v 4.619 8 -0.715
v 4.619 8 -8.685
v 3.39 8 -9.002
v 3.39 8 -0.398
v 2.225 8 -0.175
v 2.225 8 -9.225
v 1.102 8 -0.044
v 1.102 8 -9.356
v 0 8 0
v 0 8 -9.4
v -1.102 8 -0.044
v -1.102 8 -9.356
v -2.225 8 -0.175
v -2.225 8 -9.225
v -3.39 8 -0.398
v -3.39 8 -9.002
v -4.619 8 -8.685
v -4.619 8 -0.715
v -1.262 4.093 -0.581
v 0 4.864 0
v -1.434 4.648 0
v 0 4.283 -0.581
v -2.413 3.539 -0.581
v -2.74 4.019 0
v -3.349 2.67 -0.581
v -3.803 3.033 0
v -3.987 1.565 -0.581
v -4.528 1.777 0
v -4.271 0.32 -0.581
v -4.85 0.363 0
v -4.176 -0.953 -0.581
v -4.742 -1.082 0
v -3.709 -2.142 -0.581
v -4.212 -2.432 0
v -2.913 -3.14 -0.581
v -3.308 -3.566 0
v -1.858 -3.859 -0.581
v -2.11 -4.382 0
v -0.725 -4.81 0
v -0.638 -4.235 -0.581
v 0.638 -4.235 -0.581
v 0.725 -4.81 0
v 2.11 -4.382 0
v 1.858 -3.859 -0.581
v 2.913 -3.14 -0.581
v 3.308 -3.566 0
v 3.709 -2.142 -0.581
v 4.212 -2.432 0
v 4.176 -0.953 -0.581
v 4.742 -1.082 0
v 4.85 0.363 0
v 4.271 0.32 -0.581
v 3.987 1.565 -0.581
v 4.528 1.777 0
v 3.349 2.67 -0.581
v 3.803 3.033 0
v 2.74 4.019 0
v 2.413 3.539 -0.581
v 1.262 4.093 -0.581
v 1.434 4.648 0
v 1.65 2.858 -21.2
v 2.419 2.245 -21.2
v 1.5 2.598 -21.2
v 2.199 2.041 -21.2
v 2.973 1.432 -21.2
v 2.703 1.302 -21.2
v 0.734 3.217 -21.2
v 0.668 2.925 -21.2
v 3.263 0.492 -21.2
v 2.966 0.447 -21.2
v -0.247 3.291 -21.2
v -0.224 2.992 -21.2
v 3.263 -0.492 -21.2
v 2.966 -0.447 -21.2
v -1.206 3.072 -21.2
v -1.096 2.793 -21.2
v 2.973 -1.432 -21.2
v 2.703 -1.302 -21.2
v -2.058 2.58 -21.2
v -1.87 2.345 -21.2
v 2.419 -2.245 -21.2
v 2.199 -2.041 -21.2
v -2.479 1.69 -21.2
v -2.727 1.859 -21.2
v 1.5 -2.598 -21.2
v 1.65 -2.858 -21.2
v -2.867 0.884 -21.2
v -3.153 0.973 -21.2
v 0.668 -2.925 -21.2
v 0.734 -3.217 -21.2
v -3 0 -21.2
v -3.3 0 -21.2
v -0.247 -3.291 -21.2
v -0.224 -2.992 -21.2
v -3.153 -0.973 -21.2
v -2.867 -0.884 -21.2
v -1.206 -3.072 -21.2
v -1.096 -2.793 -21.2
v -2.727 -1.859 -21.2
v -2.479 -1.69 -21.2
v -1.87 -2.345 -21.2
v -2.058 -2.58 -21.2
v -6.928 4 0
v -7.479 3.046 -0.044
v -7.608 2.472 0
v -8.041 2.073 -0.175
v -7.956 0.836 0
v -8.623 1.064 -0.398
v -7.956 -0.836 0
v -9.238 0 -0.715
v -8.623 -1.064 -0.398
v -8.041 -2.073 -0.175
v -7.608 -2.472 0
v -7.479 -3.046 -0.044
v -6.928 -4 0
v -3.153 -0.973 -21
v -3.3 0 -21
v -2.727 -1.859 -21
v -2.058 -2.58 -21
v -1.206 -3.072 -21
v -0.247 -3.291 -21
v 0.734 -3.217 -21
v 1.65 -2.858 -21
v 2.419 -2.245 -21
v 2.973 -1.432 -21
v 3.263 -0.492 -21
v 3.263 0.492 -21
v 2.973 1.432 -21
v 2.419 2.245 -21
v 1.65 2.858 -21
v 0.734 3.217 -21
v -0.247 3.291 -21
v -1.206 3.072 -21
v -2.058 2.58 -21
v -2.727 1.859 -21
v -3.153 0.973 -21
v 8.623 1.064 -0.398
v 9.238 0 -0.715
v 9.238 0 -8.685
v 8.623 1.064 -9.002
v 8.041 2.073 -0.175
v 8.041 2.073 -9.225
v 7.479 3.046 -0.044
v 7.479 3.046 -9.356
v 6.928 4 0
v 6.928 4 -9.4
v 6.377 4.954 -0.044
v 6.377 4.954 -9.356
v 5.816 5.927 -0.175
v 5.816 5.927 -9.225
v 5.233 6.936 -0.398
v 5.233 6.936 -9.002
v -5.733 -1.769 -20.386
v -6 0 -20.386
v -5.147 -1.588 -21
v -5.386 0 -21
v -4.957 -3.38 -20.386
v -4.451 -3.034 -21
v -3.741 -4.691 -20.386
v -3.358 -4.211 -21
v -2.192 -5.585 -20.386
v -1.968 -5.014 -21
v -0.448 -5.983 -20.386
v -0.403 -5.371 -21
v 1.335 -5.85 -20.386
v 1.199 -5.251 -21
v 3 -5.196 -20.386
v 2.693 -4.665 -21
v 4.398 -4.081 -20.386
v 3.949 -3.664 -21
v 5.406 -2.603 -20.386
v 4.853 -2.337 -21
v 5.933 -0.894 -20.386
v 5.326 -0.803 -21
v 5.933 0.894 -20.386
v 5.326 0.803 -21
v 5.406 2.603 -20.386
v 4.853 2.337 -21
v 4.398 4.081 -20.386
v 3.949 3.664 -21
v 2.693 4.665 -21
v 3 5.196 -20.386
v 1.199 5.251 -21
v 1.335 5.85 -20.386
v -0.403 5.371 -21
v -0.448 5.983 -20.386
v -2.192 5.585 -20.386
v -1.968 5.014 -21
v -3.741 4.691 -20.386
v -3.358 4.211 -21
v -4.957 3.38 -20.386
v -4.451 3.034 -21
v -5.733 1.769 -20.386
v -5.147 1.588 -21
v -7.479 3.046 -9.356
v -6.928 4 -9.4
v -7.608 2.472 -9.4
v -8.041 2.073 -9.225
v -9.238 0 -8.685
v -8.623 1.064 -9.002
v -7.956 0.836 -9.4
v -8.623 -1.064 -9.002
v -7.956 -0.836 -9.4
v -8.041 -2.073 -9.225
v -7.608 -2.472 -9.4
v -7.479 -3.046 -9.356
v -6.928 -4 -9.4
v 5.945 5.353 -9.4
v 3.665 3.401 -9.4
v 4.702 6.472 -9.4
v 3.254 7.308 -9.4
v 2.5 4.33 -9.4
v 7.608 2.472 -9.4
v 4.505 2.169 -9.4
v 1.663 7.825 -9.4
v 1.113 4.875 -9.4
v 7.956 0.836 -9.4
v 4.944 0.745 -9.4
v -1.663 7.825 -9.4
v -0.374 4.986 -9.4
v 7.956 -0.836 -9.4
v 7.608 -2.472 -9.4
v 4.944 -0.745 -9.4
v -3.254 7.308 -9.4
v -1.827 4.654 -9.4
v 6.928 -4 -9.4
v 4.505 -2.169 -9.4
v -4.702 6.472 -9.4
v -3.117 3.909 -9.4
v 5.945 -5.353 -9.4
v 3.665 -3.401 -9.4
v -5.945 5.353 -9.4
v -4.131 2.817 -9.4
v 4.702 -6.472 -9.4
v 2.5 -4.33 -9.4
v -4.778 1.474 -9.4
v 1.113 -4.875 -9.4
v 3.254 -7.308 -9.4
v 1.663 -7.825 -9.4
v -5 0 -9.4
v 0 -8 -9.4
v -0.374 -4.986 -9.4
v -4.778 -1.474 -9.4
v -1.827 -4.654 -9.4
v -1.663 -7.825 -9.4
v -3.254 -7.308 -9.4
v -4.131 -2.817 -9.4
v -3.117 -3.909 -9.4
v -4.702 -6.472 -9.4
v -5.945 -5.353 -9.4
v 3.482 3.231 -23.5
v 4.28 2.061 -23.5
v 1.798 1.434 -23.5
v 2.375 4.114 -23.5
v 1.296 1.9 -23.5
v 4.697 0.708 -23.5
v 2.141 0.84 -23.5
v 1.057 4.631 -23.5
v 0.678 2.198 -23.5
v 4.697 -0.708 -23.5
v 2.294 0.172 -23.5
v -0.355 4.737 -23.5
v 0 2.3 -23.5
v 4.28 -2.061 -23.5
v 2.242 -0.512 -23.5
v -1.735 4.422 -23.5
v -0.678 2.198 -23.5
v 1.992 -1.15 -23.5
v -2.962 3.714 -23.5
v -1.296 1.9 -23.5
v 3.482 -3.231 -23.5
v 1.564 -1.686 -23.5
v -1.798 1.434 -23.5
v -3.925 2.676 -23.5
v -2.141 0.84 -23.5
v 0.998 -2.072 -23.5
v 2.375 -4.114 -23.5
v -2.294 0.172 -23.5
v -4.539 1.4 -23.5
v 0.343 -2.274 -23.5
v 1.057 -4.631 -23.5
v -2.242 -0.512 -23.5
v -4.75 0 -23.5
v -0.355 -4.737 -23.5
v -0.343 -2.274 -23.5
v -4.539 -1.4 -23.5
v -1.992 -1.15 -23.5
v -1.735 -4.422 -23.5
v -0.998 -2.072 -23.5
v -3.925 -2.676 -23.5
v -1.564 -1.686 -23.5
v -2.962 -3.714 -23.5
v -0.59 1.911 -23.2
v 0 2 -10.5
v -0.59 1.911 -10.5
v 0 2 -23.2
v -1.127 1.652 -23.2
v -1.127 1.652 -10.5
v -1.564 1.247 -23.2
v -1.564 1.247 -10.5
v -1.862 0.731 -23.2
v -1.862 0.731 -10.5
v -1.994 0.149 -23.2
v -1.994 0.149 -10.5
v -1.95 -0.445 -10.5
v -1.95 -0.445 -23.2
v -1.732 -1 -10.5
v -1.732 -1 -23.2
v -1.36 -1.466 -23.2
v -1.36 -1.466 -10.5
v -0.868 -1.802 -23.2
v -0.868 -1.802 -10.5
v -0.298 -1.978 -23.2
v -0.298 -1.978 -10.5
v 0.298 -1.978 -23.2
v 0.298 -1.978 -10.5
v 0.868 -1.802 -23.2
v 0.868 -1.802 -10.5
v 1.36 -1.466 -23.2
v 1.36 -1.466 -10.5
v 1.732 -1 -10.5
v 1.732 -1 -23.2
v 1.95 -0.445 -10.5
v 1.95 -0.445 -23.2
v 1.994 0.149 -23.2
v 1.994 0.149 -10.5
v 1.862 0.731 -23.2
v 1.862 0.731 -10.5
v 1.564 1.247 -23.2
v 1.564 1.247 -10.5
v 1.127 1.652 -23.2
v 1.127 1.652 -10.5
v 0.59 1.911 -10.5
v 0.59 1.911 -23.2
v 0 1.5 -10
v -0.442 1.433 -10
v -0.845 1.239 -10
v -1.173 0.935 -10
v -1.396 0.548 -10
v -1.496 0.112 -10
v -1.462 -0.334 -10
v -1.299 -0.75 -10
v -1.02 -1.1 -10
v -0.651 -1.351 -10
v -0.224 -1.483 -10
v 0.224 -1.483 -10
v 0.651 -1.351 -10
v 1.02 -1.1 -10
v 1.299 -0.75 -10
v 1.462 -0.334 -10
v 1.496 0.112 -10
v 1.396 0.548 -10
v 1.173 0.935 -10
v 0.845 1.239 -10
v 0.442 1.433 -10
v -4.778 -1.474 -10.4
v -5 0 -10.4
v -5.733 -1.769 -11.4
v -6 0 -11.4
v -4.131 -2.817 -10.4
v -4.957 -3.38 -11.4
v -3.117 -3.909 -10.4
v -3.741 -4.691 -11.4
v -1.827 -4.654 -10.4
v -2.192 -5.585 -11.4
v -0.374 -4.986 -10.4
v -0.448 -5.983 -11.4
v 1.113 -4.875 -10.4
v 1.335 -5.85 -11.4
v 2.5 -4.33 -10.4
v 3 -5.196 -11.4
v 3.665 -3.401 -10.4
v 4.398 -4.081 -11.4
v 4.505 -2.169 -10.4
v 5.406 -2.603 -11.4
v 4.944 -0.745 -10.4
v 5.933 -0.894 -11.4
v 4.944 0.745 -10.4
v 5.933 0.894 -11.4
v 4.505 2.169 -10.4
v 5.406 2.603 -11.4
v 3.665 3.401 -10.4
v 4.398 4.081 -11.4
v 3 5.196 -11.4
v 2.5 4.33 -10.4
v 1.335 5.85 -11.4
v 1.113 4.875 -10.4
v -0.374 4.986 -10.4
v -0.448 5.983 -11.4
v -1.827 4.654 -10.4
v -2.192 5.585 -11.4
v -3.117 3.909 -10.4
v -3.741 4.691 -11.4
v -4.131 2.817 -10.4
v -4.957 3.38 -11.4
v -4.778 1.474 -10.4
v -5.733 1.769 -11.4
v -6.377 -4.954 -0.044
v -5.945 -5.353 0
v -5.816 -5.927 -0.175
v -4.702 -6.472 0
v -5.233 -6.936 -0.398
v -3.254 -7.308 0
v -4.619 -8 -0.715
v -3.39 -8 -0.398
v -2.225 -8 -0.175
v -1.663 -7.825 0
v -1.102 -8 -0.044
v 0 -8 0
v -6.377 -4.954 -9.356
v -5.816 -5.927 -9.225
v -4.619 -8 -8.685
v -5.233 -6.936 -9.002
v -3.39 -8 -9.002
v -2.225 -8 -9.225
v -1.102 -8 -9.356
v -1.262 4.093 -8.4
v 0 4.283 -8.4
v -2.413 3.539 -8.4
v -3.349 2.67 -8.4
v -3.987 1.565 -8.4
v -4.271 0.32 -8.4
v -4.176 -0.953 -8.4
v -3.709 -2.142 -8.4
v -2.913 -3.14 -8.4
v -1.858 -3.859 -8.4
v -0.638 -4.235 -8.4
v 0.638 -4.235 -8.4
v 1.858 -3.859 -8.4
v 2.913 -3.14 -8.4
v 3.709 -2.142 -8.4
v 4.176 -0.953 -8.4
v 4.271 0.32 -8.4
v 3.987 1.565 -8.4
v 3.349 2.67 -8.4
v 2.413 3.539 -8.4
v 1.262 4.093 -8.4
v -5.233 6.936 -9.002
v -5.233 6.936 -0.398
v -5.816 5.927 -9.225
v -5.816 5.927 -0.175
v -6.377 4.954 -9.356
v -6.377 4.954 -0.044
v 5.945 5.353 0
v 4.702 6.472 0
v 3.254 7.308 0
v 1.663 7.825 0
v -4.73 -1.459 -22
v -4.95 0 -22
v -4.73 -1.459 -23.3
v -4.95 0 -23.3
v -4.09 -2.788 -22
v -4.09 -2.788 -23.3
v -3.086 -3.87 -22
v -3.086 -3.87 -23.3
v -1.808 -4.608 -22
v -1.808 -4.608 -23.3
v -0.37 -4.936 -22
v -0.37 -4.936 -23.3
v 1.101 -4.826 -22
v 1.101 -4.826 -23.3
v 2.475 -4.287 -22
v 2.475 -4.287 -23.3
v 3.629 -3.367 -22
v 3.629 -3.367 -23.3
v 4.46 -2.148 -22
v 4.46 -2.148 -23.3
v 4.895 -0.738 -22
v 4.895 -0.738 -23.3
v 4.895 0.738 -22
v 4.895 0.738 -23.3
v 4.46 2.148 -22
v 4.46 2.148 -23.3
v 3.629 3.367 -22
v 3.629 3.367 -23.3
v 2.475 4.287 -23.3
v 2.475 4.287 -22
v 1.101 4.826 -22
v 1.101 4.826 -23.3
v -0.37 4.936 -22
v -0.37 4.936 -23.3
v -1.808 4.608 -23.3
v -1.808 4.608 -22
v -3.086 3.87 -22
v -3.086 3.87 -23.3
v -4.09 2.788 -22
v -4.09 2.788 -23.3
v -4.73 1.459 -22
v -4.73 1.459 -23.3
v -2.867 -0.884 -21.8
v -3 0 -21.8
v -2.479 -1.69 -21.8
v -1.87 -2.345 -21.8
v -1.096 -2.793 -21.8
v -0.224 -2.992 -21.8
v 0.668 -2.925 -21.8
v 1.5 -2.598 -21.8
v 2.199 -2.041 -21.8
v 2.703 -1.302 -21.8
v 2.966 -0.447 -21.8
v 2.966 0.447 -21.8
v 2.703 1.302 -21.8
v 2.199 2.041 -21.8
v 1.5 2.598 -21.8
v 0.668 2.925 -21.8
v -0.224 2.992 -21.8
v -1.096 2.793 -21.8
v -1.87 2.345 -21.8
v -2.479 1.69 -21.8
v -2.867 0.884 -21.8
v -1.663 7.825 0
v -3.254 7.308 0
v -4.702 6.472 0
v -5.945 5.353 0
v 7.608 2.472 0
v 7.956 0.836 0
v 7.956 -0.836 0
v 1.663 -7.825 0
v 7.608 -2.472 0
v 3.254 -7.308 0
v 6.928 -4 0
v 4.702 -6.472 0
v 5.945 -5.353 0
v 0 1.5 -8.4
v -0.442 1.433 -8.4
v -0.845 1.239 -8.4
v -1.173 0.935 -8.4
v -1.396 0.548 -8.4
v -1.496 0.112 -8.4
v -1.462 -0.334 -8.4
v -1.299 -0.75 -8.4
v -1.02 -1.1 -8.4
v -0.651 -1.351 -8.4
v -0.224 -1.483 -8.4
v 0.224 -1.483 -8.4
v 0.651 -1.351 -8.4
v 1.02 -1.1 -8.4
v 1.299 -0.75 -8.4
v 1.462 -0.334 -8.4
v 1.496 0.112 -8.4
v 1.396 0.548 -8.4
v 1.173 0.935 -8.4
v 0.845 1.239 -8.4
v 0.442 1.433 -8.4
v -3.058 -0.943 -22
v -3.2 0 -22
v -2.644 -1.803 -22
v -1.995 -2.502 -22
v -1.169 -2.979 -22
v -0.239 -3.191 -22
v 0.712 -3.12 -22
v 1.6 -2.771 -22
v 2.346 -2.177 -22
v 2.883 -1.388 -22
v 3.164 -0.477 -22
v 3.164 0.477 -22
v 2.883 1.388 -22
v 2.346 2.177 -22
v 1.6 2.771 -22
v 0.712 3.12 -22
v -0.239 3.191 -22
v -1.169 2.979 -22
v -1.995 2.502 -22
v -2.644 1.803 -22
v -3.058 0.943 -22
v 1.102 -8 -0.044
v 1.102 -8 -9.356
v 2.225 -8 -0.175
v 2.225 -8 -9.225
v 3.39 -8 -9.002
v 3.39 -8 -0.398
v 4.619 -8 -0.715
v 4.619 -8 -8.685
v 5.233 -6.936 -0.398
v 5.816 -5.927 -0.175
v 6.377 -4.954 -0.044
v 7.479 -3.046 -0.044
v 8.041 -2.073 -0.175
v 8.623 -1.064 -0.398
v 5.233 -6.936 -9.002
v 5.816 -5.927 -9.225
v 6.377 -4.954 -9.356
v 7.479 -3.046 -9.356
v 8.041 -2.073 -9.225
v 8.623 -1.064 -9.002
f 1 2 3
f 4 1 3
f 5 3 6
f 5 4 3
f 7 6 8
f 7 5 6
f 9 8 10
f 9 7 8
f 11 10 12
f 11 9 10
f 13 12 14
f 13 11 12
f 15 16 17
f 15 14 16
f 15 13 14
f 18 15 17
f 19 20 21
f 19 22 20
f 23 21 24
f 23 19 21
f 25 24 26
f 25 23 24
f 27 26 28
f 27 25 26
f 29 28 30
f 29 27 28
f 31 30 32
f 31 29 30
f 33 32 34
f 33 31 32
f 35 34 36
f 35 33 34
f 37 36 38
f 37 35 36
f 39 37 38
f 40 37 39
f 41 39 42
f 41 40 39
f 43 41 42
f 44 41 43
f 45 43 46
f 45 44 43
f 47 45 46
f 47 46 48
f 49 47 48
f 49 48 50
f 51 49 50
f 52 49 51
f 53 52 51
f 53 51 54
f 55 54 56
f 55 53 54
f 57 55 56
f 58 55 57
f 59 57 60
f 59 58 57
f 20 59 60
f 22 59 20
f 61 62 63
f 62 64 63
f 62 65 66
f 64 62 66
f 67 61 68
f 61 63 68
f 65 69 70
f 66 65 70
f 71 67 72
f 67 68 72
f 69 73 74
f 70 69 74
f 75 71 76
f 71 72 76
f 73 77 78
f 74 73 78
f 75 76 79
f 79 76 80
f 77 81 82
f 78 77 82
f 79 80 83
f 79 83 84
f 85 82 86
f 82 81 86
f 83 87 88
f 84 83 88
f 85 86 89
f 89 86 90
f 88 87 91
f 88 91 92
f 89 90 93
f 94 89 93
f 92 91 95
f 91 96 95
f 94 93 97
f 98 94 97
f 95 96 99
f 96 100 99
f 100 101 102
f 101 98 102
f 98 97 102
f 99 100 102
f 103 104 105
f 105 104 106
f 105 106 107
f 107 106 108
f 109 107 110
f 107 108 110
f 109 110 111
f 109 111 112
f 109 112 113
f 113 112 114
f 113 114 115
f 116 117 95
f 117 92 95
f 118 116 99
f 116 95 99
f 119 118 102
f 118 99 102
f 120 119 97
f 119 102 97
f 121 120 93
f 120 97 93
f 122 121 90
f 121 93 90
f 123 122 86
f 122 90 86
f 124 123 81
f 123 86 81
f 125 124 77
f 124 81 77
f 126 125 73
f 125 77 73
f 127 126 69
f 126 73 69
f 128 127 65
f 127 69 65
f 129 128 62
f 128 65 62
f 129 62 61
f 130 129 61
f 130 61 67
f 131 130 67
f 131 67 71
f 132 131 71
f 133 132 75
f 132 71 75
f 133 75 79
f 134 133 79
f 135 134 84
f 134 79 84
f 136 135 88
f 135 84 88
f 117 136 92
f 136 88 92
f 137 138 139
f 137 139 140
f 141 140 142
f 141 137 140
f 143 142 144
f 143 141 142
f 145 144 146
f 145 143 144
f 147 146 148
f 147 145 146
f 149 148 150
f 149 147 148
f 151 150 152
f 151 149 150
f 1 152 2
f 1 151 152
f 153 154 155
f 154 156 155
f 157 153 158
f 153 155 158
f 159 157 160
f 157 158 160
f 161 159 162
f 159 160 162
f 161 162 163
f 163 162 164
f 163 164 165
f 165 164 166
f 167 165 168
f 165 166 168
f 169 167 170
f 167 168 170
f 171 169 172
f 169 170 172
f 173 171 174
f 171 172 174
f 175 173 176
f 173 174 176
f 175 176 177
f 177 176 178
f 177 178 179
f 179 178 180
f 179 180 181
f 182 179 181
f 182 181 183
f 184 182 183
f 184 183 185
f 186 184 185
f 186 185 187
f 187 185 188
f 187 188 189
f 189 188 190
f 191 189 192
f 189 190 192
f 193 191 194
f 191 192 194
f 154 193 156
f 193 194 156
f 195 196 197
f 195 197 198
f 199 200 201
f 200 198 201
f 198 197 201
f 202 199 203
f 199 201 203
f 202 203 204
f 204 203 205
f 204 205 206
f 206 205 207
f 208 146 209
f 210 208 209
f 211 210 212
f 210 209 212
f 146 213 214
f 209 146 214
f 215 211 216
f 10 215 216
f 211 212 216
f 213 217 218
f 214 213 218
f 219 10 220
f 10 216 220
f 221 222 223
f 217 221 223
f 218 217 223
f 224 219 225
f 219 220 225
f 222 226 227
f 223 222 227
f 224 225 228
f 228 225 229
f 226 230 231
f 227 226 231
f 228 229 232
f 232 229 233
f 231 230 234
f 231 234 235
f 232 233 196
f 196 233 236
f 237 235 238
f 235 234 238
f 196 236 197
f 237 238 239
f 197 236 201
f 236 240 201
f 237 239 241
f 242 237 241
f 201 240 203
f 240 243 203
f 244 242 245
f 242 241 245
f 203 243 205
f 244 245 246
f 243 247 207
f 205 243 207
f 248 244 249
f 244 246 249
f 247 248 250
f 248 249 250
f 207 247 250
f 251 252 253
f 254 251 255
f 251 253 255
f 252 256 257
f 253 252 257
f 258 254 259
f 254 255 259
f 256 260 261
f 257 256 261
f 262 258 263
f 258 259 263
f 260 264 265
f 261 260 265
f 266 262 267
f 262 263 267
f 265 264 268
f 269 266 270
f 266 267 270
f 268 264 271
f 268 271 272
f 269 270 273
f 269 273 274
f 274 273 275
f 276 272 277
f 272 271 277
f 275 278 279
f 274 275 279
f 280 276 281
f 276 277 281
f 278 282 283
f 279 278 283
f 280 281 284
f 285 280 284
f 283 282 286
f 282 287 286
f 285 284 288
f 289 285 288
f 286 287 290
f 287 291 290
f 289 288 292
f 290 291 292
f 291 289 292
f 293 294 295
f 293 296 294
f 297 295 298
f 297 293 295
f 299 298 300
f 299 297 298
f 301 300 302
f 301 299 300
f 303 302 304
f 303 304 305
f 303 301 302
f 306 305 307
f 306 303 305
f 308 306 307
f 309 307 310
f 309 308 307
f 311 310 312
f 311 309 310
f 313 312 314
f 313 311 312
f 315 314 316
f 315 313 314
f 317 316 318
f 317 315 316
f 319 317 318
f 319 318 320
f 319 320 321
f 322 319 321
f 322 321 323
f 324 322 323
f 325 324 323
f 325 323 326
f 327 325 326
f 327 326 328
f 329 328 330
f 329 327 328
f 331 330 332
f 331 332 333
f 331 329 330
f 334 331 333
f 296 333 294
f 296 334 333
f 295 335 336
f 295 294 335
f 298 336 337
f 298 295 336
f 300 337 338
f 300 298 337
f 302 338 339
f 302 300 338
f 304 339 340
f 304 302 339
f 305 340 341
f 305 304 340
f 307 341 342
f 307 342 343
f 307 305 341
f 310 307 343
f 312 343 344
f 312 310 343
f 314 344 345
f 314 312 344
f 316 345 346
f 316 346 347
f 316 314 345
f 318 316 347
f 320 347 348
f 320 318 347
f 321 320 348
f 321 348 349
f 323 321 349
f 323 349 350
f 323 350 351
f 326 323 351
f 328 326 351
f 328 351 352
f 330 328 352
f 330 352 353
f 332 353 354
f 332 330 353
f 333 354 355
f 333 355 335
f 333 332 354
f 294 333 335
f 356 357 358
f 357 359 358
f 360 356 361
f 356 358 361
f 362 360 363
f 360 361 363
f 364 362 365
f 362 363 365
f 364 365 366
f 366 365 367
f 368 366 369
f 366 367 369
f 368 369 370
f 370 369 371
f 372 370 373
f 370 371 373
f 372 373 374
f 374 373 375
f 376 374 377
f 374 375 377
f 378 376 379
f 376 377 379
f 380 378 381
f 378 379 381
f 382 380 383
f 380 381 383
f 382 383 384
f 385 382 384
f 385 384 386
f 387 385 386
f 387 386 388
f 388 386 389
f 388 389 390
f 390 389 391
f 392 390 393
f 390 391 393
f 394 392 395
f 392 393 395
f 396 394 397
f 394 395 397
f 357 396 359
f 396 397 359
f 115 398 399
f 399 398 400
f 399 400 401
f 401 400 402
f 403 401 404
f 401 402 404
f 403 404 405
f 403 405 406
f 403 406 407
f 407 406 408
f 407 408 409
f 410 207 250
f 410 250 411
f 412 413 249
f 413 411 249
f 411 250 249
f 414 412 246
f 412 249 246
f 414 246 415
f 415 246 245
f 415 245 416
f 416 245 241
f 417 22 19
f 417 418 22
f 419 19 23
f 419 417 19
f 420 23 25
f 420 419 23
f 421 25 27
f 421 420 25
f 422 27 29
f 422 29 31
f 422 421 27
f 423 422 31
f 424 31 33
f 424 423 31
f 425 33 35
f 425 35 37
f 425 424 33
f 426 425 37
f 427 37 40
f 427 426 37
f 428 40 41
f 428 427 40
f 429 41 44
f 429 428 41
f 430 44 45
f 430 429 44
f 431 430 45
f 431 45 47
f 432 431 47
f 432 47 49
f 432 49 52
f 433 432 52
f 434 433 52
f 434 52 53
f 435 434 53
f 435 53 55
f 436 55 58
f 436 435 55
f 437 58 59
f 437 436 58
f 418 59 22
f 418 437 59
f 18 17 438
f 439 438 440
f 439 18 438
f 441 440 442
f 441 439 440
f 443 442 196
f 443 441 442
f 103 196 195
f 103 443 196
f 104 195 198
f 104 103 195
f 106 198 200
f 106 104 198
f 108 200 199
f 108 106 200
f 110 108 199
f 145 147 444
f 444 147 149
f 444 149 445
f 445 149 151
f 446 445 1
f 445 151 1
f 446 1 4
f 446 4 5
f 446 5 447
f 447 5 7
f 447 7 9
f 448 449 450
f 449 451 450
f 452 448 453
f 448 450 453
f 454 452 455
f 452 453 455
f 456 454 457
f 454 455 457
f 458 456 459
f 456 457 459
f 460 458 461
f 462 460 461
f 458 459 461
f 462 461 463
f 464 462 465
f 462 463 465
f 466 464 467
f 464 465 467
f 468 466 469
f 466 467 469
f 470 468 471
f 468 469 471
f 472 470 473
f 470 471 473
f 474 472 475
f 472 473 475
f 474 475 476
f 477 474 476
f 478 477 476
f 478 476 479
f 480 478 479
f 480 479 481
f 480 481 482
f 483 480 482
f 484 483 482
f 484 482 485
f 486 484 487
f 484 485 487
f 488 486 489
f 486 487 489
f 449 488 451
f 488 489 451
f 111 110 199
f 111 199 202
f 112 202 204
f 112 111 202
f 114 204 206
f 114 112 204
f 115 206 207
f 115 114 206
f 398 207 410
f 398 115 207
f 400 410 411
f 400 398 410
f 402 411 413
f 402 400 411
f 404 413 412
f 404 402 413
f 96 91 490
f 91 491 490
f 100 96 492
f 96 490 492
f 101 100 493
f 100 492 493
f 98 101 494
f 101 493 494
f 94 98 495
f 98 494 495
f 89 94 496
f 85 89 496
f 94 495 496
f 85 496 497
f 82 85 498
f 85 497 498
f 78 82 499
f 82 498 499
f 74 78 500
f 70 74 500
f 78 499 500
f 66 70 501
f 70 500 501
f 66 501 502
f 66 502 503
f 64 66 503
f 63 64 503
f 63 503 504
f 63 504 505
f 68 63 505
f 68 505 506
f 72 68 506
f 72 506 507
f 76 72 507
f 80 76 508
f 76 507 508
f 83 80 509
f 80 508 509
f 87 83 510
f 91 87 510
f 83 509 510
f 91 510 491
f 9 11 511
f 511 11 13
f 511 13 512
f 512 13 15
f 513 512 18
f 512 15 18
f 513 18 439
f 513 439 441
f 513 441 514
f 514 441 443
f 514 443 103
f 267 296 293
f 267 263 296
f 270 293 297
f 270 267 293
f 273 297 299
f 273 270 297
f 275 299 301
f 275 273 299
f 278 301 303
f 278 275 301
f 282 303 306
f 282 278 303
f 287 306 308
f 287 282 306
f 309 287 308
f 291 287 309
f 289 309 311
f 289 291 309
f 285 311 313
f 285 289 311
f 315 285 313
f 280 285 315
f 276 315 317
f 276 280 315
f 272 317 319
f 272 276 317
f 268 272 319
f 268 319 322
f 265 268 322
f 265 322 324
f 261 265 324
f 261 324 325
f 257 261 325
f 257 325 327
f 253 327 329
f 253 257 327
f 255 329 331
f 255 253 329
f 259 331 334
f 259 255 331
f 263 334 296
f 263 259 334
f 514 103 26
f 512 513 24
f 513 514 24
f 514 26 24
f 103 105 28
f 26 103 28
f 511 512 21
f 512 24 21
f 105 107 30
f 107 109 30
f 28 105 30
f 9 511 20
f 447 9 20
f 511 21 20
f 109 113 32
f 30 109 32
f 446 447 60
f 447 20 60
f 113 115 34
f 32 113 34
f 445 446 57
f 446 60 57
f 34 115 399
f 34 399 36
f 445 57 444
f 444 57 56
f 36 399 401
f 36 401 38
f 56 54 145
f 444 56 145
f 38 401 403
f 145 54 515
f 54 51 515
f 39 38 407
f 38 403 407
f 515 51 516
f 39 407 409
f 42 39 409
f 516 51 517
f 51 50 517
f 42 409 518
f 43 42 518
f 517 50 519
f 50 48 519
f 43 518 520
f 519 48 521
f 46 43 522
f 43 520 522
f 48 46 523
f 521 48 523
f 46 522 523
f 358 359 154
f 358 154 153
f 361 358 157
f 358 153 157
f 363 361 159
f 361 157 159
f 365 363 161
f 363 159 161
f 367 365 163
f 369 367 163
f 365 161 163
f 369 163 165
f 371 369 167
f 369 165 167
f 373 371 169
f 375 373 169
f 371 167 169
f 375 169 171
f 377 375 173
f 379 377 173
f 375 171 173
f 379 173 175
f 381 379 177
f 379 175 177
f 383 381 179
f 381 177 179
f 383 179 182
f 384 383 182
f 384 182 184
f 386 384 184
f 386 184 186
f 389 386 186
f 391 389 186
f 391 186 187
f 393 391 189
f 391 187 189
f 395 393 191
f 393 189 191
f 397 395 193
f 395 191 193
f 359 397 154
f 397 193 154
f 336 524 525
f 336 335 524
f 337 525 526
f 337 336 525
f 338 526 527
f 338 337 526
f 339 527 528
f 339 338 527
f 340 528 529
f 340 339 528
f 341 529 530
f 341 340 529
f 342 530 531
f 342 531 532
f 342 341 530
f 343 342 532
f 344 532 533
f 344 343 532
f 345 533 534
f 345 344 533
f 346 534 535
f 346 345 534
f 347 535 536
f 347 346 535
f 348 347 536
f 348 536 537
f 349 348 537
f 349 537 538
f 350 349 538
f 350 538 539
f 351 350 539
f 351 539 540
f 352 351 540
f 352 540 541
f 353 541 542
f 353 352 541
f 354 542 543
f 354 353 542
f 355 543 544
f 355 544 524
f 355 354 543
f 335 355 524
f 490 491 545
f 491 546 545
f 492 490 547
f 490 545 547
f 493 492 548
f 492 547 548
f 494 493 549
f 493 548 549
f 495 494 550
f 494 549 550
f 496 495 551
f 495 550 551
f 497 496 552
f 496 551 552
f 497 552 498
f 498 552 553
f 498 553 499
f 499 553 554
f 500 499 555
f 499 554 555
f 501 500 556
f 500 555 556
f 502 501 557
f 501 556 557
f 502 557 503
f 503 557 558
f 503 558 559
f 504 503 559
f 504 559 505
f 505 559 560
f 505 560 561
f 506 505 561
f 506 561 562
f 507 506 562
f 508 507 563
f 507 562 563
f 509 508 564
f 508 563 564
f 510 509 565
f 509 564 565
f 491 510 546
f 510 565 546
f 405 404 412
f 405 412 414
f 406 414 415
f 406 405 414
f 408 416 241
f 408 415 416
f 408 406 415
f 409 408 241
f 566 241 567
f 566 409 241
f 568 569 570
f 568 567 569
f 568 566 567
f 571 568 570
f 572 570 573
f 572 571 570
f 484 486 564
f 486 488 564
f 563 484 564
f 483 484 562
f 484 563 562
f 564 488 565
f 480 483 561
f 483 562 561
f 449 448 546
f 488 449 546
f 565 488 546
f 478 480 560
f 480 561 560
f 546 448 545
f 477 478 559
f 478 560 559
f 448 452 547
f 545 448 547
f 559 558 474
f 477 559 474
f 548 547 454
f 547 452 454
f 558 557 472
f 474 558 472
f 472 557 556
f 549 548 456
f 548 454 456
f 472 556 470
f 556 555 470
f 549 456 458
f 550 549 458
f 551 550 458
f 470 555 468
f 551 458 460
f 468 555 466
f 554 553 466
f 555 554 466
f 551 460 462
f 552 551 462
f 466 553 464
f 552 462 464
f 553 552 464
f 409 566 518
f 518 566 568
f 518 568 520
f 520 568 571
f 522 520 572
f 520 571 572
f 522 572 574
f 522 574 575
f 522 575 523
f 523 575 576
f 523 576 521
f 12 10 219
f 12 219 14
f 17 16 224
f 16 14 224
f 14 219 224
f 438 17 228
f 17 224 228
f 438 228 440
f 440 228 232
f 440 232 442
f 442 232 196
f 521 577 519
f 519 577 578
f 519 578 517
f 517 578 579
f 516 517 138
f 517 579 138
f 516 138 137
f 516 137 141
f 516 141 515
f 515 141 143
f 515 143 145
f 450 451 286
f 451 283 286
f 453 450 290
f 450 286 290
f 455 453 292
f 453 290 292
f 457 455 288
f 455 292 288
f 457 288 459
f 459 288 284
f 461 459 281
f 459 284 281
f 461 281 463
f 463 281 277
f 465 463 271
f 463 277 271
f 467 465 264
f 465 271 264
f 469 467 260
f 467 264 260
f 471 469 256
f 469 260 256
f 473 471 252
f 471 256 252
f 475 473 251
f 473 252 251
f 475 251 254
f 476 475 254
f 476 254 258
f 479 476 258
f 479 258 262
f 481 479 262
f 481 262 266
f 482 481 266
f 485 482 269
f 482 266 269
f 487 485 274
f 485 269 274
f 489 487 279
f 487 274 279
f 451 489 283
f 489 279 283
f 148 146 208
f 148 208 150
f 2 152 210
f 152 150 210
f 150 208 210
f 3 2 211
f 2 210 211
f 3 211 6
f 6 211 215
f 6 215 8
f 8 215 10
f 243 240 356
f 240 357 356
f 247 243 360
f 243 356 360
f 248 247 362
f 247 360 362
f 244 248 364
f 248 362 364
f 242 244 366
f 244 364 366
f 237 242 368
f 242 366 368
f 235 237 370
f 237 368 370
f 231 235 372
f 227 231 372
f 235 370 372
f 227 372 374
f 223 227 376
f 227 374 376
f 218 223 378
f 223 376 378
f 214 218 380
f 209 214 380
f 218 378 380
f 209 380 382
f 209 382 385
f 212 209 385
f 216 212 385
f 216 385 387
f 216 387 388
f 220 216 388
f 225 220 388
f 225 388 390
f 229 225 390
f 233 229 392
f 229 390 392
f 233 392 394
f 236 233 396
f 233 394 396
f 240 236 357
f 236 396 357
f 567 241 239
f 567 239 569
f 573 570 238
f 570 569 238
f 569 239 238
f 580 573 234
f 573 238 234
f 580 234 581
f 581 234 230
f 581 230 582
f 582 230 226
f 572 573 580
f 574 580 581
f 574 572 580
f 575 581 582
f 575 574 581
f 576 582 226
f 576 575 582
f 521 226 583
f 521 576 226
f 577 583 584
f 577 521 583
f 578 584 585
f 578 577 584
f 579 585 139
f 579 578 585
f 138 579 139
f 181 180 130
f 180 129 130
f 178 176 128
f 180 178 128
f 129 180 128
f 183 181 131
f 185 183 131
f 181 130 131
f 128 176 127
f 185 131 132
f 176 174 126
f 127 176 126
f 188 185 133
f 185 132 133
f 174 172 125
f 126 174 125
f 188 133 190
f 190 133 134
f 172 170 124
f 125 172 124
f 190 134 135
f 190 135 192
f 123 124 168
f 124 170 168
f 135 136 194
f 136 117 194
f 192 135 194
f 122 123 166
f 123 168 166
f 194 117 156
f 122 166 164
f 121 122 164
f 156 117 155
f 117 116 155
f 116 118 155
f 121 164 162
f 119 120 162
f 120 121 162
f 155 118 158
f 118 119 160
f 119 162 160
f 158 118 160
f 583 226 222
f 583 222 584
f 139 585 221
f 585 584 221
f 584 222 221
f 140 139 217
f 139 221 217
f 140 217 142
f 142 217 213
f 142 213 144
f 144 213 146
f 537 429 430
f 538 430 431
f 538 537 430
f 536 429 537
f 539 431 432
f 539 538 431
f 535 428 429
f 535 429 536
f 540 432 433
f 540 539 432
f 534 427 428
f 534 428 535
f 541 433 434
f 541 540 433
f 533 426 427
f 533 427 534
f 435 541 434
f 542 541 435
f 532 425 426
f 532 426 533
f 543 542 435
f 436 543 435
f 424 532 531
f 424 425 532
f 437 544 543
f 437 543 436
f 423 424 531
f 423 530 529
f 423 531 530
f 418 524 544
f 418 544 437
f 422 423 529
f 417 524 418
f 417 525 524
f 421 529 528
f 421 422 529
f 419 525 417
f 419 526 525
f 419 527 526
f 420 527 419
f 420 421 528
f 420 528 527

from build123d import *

# Parameters (mm, degrees)
SKETCH2_W          = 32
SKETCH2_H          = 32
CUT_EXTRUDE1_DEPTH = 9.4


with BuildPart() as part:
    # Sketch1 → Revolve1 (revolve)
    with BuildSketch(Plane(origin=(0, 0, 0), x_dir=(1, 0, 0), z_dir=(0, 1, 0))):
        Polygon((0, 0), (-8, 0), (-9.6, 0.923760431), (-9.6, 8.476239569), (-8, 9.4), (-5, 9.4), (-5, 10.4), (-6, 11.4), (-6, 20.3865), (-5.3865, 21), (-3.3, 21), (-3.3, 21.2), (-3, 21.2), (-3, 21.8), (-3.2, 22), (-4.95, 22), (-4.95, 23.3), (-4.75, 23.5), (0, 23.5), align=None)
    revolve(axis=Axis((0, 0, -23.5), (0, 0, 1)))

    # Sketch2 → Cut-Extrude1 (cut)
    with BuildSketch(Plane.XY):
        Rectangle(SKETCH2_W, SKETCH2_H)
        Polygon((-9.237604307, 0), (-4.618802154, -8), (4.618802154, -8), (9.237604307, 0), (4.618802154, 8), (-4.618802154, 8), align=None, mode=Mode.SUBTRACT)
    extrude(amount=-CUT_EXTRUDE1_DEPTH, mode=Mode.SUBTRACT)

    # Sketch3 → Cut-Revolve1 (revolve, cut)
    with BuildSketch(Plane(origin=(0, 0, 0), x_dir=(0, 0, -1), z_dir=(1, 0, 0))):
        Polygon((0, 0), (0, 4.864), (0.581, 4.283), (8.4, 4.283), (8.4, 1.5), (10, 1.5), (10.5, 2), (23.2, 2), (23.5, 2.3), (23.5, 0), align=None)
    revolve(axis=Axis((0, 0, -23.5), (0, 0, 1)), mode=Mode.SUBTRACT)


solid = part.part
